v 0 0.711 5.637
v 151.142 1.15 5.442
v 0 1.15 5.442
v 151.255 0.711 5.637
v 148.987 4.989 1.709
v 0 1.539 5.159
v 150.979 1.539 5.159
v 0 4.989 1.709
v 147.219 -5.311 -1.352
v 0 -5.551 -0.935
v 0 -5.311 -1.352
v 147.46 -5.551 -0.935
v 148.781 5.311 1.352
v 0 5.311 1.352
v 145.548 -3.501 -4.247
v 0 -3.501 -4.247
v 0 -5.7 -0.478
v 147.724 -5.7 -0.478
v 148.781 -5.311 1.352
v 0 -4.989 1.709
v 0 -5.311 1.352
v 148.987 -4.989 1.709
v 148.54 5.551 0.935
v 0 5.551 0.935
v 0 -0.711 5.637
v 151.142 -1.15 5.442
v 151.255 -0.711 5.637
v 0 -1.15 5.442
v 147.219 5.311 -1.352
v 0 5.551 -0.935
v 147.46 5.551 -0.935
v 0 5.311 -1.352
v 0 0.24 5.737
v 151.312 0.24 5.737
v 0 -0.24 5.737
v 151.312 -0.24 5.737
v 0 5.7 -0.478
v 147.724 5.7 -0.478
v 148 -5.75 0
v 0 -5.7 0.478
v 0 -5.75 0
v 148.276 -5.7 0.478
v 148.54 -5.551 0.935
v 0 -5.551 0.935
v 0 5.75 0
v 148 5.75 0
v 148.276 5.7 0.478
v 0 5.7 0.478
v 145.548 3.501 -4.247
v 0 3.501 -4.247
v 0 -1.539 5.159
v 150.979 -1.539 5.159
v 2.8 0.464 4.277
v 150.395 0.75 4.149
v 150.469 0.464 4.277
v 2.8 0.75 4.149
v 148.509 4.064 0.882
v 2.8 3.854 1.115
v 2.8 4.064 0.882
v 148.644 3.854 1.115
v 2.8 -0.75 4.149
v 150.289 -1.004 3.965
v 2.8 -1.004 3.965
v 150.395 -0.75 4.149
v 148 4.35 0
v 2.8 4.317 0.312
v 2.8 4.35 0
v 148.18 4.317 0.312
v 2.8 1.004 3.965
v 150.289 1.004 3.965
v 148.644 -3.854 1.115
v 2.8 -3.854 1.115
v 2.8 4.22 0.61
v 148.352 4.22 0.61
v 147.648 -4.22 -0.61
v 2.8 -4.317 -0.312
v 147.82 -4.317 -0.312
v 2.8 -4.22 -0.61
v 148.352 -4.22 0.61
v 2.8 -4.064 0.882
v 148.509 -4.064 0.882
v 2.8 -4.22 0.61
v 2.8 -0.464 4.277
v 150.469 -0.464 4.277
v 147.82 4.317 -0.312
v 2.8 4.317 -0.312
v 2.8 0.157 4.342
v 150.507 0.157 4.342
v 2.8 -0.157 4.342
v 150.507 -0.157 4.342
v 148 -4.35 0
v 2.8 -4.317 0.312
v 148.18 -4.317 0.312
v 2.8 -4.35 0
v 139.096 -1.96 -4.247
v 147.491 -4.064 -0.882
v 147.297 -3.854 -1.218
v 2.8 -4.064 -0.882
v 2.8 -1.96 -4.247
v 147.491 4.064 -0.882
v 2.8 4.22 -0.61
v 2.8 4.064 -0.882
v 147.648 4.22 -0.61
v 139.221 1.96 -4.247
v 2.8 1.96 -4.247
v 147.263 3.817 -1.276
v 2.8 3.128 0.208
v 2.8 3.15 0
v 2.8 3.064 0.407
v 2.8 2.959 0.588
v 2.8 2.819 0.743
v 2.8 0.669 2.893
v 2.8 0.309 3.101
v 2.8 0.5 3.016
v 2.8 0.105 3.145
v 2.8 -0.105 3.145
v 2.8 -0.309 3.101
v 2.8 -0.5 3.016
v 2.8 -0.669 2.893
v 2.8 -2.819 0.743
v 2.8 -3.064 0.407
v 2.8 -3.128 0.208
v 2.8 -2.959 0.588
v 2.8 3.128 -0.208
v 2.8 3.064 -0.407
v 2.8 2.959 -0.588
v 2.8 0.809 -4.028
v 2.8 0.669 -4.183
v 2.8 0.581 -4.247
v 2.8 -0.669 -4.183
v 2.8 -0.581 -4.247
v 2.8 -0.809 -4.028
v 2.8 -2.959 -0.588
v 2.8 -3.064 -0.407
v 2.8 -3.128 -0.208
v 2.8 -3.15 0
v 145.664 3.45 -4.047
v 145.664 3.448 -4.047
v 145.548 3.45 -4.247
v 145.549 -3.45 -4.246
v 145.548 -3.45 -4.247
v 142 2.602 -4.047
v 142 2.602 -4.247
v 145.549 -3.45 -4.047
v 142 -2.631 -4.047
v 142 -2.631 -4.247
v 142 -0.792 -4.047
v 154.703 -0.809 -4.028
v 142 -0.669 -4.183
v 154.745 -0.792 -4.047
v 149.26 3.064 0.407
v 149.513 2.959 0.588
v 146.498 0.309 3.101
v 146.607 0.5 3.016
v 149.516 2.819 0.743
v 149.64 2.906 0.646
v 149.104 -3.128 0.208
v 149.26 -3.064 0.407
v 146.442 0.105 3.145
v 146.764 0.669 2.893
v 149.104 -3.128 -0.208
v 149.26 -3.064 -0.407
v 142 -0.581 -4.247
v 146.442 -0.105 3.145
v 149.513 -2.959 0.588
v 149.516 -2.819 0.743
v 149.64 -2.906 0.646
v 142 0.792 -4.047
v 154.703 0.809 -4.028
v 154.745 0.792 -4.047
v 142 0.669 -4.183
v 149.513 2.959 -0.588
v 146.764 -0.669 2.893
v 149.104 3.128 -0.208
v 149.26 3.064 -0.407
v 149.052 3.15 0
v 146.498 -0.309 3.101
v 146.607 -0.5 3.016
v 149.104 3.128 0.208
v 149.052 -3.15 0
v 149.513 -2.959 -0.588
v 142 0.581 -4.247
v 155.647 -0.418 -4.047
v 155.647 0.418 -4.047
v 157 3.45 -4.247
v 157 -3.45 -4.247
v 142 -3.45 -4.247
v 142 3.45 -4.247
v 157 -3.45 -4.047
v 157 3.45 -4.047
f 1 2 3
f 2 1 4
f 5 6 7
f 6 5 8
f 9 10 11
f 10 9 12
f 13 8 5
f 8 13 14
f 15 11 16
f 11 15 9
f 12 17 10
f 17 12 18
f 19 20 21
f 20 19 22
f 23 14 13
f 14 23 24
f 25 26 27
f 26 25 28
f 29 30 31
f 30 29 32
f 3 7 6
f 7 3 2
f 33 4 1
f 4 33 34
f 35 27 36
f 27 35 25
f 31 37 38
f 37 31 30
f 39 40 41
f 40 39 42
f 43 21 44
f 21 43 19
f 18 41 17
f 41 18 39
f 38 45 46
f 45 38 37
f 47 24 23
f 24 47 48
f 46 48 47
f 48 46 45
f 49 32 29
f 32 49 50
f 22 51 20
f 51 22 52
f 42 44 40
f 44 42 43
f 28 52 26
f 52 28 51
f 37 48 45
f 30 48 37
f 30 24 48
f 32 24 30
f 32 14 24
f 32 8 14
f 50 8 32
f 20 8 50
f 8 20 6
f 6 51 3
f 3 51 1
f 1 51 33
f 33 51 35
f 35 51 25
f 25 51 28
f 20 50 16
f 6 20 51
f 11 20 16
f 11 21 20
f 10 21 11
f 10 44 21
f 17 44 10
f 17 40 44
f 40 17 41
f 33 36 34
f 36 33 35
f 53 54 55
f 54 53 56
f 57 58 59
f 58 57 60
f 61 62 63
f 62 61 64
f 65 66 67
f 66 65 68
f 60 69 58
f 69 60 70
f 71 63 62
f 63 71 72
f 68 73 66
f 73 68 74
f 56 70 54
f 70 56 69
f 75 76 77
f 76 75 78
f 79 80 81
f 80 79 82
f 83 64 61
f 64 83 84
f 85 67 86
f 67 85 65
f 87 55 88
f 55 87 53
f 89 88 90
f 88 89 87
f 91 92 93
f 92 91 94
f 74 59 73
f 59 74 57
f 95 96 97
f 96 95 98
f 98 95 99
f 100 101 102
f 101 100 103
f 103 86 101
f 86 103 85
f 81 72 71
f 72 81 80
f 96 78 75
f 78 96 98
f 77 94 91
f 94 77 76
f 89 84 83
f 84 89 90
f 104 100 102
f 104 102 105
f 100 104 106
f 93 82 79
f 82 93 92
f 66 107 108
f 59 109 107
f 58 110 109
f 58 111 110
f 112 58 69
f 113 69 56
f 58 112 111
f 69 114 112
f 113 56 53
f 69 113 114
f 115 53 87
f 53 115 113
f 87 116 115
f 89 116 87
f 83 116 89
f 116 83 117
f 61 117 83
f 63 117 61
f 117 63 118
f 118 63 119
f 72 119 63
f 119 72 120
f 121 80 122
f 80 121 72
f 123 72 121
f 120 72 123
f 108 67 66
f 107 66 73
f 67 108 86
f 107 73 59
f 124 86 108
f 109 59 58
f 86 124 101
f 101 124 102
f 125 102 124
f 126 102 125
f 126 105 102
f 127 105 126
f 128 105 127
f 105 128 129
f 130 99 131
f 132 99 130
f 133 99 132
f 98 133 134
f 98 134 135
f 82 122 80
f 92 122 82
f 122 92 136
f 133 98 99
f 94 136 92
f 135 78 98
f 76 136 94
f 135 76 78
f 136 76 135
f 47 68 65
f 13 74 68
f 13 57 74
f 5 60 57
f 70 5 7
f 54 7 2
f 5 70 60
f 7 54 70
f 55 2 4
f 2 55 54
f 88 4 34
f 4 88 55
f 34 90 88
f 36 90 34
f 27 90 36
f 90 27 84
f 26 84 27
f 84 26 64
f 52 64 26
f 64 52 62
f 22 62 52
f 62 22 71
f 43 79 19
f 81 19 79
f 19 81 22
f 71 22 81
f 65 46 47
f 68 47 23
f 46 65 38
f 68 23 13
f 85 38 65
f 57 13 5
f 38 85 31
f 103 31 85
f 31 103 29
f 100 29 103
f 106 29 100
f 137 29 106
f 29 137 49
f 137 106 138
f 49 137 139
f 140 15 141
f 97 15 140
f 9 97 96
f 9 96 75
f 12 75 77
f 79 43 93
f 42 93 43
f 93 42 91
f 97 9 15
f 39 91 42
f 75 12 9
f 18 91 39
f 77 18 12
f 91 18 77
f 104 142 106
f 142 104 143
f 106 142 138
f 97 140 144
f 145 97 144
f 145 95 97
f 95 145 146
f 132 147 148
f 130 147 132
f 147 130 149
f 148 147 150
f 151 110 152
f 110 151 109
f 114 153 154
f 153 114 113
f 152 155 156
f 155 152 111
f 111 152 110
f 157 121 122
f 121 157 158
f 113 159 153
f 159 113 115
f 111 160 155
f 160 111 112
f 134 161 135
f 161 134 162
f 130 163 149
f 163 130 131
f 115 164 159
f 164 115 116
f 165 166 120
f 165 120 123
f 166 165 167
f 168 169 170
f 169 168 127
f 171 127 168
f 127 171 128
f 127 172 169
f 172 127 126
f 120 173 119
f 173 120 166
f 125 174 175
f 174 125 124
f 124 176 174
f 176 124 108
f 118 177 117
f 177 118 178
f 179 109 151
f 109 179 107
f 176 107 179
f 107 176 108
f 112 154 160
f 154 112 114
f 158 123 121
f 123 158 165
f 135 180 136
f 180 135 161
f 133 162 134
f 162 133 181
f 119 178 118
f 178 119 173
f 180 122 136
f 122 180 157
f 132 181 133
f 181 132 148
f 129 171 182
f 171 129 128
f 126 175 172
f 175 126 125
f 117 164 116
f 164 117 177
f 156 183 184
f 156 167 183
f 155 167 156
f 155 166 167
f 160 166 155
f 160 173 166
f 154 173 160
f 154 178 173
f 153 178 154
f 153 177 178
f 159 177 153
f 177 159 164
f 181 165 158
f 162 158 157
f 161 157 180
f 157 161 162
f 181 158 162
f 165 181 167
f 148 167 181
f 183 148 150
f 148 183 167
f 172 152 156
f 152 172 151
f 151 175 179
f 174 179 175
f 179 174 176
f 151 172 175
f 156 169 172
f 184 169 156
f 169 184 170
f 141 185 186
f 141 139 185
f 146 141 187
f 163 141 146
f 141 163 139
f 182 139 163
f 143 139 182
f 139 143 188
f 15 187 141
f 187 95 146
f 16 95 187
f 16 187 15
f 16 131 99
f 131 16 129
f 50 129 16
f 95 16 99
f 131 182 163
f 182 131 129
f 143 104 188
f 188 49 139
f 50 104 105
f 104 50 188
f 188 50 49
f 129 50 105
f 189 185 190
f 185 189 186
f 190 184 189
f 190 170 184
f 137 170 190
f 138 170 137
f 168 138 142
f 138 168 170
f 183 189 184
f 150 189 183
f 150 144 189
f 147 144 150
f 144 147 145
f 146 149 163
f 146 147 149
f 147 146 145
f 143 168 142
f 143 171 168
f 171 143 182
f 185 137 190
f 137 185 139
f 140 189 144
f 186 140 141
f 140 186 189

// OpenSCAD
skew = 1.6;

module rod(height, width, radius) {
    w = width/2 - radius;
    rotate([0, 0, 90])
    rotate([90, 0, 0])
    minkowski() {
        cylinder(height = 0.1, r = radius, $fn = 30);
        linear_extrude(height = height)
            polygon(points = [[w, 0], [0, w], [-w, 0], [0, -skew*w]]);
    }
}

module hollow_rod(length, width, radius, thickness) {
    difference() {
        rod(length, width, radius);
        translate([thickness*2, 0, 0]) 
            rod(length, width - thickness*2, radius-0.8);
    }
}

module interior(length, width, radius) {
    distance = 4.5;
    angulo_punta = 38;
    difference() {
        rod(length + distance + 5, width, radius);
        /*
        */
        // color("red", 0.5)
        translate([length + width + distance, 0, 0])
            rotate([0, angulo_punta, 0])
                cube([width*5, width*2, width*2], center = true);
        // color("red", 0.3)
        translate([length + distance/2 - width*1.5, -width*2, -width]) 
            rotate([0, 0, 22.5]) 
                cube([width*5, width, width*3]); 
        // color("red", 0.3)
        translate([length + distance/2 - width*1.5, width*2, -width]) 
            rotate([0, 0, -22.5])
                translate([0, -width, 0])
                    cube([width*5, width, width*3]);

    }
}

module exterior(length, width, thickness) {
    distance = 1;
    angulo = 30;
    difference() {
        hollow_rod(length + distance, width, 2.3, thickness);
        translate([length + distance - 3, 0, 0])
            rotate([0, angulo, 0])
                translate([0, -width, -width]) 
                    cube([width*2, width*2, width*2]);
        translate([length-4.5+distance, width/6, 0])
        
        rotate([0, 0, 13])
            translate([-width*.8, 0, -width/2]) 
                cube([width, thickness*1.2, width/2.2]);
        translate([length-4.5+distance, -width/6, 0])
        rotate([0, 0, -13])
            translate([-width*.8, -thickness*1.22, -width/2]) 
                cube([width, thickness*2, width/2.2]);
    } 
}

module clip(length, width, thickness, space) {
    z = -(width-thickness*.1)*.88;
    difference() {
        union() {
            exterior(length, width, thickness);
            interior(length - 0.1, width - 2*thickness - 2*space, 1);
        }
        translate([0, 0, z])
            cube([length*10, width*2, width], center = true);
    }
    translate([length-8, -width*.3, z + width/2])
        cube([15, width*.6, 0.2]);
}

clip(
    length    = 150, 
    width     = 11.5, 
    thickness = 1.4,
    space     = 1.2
);
